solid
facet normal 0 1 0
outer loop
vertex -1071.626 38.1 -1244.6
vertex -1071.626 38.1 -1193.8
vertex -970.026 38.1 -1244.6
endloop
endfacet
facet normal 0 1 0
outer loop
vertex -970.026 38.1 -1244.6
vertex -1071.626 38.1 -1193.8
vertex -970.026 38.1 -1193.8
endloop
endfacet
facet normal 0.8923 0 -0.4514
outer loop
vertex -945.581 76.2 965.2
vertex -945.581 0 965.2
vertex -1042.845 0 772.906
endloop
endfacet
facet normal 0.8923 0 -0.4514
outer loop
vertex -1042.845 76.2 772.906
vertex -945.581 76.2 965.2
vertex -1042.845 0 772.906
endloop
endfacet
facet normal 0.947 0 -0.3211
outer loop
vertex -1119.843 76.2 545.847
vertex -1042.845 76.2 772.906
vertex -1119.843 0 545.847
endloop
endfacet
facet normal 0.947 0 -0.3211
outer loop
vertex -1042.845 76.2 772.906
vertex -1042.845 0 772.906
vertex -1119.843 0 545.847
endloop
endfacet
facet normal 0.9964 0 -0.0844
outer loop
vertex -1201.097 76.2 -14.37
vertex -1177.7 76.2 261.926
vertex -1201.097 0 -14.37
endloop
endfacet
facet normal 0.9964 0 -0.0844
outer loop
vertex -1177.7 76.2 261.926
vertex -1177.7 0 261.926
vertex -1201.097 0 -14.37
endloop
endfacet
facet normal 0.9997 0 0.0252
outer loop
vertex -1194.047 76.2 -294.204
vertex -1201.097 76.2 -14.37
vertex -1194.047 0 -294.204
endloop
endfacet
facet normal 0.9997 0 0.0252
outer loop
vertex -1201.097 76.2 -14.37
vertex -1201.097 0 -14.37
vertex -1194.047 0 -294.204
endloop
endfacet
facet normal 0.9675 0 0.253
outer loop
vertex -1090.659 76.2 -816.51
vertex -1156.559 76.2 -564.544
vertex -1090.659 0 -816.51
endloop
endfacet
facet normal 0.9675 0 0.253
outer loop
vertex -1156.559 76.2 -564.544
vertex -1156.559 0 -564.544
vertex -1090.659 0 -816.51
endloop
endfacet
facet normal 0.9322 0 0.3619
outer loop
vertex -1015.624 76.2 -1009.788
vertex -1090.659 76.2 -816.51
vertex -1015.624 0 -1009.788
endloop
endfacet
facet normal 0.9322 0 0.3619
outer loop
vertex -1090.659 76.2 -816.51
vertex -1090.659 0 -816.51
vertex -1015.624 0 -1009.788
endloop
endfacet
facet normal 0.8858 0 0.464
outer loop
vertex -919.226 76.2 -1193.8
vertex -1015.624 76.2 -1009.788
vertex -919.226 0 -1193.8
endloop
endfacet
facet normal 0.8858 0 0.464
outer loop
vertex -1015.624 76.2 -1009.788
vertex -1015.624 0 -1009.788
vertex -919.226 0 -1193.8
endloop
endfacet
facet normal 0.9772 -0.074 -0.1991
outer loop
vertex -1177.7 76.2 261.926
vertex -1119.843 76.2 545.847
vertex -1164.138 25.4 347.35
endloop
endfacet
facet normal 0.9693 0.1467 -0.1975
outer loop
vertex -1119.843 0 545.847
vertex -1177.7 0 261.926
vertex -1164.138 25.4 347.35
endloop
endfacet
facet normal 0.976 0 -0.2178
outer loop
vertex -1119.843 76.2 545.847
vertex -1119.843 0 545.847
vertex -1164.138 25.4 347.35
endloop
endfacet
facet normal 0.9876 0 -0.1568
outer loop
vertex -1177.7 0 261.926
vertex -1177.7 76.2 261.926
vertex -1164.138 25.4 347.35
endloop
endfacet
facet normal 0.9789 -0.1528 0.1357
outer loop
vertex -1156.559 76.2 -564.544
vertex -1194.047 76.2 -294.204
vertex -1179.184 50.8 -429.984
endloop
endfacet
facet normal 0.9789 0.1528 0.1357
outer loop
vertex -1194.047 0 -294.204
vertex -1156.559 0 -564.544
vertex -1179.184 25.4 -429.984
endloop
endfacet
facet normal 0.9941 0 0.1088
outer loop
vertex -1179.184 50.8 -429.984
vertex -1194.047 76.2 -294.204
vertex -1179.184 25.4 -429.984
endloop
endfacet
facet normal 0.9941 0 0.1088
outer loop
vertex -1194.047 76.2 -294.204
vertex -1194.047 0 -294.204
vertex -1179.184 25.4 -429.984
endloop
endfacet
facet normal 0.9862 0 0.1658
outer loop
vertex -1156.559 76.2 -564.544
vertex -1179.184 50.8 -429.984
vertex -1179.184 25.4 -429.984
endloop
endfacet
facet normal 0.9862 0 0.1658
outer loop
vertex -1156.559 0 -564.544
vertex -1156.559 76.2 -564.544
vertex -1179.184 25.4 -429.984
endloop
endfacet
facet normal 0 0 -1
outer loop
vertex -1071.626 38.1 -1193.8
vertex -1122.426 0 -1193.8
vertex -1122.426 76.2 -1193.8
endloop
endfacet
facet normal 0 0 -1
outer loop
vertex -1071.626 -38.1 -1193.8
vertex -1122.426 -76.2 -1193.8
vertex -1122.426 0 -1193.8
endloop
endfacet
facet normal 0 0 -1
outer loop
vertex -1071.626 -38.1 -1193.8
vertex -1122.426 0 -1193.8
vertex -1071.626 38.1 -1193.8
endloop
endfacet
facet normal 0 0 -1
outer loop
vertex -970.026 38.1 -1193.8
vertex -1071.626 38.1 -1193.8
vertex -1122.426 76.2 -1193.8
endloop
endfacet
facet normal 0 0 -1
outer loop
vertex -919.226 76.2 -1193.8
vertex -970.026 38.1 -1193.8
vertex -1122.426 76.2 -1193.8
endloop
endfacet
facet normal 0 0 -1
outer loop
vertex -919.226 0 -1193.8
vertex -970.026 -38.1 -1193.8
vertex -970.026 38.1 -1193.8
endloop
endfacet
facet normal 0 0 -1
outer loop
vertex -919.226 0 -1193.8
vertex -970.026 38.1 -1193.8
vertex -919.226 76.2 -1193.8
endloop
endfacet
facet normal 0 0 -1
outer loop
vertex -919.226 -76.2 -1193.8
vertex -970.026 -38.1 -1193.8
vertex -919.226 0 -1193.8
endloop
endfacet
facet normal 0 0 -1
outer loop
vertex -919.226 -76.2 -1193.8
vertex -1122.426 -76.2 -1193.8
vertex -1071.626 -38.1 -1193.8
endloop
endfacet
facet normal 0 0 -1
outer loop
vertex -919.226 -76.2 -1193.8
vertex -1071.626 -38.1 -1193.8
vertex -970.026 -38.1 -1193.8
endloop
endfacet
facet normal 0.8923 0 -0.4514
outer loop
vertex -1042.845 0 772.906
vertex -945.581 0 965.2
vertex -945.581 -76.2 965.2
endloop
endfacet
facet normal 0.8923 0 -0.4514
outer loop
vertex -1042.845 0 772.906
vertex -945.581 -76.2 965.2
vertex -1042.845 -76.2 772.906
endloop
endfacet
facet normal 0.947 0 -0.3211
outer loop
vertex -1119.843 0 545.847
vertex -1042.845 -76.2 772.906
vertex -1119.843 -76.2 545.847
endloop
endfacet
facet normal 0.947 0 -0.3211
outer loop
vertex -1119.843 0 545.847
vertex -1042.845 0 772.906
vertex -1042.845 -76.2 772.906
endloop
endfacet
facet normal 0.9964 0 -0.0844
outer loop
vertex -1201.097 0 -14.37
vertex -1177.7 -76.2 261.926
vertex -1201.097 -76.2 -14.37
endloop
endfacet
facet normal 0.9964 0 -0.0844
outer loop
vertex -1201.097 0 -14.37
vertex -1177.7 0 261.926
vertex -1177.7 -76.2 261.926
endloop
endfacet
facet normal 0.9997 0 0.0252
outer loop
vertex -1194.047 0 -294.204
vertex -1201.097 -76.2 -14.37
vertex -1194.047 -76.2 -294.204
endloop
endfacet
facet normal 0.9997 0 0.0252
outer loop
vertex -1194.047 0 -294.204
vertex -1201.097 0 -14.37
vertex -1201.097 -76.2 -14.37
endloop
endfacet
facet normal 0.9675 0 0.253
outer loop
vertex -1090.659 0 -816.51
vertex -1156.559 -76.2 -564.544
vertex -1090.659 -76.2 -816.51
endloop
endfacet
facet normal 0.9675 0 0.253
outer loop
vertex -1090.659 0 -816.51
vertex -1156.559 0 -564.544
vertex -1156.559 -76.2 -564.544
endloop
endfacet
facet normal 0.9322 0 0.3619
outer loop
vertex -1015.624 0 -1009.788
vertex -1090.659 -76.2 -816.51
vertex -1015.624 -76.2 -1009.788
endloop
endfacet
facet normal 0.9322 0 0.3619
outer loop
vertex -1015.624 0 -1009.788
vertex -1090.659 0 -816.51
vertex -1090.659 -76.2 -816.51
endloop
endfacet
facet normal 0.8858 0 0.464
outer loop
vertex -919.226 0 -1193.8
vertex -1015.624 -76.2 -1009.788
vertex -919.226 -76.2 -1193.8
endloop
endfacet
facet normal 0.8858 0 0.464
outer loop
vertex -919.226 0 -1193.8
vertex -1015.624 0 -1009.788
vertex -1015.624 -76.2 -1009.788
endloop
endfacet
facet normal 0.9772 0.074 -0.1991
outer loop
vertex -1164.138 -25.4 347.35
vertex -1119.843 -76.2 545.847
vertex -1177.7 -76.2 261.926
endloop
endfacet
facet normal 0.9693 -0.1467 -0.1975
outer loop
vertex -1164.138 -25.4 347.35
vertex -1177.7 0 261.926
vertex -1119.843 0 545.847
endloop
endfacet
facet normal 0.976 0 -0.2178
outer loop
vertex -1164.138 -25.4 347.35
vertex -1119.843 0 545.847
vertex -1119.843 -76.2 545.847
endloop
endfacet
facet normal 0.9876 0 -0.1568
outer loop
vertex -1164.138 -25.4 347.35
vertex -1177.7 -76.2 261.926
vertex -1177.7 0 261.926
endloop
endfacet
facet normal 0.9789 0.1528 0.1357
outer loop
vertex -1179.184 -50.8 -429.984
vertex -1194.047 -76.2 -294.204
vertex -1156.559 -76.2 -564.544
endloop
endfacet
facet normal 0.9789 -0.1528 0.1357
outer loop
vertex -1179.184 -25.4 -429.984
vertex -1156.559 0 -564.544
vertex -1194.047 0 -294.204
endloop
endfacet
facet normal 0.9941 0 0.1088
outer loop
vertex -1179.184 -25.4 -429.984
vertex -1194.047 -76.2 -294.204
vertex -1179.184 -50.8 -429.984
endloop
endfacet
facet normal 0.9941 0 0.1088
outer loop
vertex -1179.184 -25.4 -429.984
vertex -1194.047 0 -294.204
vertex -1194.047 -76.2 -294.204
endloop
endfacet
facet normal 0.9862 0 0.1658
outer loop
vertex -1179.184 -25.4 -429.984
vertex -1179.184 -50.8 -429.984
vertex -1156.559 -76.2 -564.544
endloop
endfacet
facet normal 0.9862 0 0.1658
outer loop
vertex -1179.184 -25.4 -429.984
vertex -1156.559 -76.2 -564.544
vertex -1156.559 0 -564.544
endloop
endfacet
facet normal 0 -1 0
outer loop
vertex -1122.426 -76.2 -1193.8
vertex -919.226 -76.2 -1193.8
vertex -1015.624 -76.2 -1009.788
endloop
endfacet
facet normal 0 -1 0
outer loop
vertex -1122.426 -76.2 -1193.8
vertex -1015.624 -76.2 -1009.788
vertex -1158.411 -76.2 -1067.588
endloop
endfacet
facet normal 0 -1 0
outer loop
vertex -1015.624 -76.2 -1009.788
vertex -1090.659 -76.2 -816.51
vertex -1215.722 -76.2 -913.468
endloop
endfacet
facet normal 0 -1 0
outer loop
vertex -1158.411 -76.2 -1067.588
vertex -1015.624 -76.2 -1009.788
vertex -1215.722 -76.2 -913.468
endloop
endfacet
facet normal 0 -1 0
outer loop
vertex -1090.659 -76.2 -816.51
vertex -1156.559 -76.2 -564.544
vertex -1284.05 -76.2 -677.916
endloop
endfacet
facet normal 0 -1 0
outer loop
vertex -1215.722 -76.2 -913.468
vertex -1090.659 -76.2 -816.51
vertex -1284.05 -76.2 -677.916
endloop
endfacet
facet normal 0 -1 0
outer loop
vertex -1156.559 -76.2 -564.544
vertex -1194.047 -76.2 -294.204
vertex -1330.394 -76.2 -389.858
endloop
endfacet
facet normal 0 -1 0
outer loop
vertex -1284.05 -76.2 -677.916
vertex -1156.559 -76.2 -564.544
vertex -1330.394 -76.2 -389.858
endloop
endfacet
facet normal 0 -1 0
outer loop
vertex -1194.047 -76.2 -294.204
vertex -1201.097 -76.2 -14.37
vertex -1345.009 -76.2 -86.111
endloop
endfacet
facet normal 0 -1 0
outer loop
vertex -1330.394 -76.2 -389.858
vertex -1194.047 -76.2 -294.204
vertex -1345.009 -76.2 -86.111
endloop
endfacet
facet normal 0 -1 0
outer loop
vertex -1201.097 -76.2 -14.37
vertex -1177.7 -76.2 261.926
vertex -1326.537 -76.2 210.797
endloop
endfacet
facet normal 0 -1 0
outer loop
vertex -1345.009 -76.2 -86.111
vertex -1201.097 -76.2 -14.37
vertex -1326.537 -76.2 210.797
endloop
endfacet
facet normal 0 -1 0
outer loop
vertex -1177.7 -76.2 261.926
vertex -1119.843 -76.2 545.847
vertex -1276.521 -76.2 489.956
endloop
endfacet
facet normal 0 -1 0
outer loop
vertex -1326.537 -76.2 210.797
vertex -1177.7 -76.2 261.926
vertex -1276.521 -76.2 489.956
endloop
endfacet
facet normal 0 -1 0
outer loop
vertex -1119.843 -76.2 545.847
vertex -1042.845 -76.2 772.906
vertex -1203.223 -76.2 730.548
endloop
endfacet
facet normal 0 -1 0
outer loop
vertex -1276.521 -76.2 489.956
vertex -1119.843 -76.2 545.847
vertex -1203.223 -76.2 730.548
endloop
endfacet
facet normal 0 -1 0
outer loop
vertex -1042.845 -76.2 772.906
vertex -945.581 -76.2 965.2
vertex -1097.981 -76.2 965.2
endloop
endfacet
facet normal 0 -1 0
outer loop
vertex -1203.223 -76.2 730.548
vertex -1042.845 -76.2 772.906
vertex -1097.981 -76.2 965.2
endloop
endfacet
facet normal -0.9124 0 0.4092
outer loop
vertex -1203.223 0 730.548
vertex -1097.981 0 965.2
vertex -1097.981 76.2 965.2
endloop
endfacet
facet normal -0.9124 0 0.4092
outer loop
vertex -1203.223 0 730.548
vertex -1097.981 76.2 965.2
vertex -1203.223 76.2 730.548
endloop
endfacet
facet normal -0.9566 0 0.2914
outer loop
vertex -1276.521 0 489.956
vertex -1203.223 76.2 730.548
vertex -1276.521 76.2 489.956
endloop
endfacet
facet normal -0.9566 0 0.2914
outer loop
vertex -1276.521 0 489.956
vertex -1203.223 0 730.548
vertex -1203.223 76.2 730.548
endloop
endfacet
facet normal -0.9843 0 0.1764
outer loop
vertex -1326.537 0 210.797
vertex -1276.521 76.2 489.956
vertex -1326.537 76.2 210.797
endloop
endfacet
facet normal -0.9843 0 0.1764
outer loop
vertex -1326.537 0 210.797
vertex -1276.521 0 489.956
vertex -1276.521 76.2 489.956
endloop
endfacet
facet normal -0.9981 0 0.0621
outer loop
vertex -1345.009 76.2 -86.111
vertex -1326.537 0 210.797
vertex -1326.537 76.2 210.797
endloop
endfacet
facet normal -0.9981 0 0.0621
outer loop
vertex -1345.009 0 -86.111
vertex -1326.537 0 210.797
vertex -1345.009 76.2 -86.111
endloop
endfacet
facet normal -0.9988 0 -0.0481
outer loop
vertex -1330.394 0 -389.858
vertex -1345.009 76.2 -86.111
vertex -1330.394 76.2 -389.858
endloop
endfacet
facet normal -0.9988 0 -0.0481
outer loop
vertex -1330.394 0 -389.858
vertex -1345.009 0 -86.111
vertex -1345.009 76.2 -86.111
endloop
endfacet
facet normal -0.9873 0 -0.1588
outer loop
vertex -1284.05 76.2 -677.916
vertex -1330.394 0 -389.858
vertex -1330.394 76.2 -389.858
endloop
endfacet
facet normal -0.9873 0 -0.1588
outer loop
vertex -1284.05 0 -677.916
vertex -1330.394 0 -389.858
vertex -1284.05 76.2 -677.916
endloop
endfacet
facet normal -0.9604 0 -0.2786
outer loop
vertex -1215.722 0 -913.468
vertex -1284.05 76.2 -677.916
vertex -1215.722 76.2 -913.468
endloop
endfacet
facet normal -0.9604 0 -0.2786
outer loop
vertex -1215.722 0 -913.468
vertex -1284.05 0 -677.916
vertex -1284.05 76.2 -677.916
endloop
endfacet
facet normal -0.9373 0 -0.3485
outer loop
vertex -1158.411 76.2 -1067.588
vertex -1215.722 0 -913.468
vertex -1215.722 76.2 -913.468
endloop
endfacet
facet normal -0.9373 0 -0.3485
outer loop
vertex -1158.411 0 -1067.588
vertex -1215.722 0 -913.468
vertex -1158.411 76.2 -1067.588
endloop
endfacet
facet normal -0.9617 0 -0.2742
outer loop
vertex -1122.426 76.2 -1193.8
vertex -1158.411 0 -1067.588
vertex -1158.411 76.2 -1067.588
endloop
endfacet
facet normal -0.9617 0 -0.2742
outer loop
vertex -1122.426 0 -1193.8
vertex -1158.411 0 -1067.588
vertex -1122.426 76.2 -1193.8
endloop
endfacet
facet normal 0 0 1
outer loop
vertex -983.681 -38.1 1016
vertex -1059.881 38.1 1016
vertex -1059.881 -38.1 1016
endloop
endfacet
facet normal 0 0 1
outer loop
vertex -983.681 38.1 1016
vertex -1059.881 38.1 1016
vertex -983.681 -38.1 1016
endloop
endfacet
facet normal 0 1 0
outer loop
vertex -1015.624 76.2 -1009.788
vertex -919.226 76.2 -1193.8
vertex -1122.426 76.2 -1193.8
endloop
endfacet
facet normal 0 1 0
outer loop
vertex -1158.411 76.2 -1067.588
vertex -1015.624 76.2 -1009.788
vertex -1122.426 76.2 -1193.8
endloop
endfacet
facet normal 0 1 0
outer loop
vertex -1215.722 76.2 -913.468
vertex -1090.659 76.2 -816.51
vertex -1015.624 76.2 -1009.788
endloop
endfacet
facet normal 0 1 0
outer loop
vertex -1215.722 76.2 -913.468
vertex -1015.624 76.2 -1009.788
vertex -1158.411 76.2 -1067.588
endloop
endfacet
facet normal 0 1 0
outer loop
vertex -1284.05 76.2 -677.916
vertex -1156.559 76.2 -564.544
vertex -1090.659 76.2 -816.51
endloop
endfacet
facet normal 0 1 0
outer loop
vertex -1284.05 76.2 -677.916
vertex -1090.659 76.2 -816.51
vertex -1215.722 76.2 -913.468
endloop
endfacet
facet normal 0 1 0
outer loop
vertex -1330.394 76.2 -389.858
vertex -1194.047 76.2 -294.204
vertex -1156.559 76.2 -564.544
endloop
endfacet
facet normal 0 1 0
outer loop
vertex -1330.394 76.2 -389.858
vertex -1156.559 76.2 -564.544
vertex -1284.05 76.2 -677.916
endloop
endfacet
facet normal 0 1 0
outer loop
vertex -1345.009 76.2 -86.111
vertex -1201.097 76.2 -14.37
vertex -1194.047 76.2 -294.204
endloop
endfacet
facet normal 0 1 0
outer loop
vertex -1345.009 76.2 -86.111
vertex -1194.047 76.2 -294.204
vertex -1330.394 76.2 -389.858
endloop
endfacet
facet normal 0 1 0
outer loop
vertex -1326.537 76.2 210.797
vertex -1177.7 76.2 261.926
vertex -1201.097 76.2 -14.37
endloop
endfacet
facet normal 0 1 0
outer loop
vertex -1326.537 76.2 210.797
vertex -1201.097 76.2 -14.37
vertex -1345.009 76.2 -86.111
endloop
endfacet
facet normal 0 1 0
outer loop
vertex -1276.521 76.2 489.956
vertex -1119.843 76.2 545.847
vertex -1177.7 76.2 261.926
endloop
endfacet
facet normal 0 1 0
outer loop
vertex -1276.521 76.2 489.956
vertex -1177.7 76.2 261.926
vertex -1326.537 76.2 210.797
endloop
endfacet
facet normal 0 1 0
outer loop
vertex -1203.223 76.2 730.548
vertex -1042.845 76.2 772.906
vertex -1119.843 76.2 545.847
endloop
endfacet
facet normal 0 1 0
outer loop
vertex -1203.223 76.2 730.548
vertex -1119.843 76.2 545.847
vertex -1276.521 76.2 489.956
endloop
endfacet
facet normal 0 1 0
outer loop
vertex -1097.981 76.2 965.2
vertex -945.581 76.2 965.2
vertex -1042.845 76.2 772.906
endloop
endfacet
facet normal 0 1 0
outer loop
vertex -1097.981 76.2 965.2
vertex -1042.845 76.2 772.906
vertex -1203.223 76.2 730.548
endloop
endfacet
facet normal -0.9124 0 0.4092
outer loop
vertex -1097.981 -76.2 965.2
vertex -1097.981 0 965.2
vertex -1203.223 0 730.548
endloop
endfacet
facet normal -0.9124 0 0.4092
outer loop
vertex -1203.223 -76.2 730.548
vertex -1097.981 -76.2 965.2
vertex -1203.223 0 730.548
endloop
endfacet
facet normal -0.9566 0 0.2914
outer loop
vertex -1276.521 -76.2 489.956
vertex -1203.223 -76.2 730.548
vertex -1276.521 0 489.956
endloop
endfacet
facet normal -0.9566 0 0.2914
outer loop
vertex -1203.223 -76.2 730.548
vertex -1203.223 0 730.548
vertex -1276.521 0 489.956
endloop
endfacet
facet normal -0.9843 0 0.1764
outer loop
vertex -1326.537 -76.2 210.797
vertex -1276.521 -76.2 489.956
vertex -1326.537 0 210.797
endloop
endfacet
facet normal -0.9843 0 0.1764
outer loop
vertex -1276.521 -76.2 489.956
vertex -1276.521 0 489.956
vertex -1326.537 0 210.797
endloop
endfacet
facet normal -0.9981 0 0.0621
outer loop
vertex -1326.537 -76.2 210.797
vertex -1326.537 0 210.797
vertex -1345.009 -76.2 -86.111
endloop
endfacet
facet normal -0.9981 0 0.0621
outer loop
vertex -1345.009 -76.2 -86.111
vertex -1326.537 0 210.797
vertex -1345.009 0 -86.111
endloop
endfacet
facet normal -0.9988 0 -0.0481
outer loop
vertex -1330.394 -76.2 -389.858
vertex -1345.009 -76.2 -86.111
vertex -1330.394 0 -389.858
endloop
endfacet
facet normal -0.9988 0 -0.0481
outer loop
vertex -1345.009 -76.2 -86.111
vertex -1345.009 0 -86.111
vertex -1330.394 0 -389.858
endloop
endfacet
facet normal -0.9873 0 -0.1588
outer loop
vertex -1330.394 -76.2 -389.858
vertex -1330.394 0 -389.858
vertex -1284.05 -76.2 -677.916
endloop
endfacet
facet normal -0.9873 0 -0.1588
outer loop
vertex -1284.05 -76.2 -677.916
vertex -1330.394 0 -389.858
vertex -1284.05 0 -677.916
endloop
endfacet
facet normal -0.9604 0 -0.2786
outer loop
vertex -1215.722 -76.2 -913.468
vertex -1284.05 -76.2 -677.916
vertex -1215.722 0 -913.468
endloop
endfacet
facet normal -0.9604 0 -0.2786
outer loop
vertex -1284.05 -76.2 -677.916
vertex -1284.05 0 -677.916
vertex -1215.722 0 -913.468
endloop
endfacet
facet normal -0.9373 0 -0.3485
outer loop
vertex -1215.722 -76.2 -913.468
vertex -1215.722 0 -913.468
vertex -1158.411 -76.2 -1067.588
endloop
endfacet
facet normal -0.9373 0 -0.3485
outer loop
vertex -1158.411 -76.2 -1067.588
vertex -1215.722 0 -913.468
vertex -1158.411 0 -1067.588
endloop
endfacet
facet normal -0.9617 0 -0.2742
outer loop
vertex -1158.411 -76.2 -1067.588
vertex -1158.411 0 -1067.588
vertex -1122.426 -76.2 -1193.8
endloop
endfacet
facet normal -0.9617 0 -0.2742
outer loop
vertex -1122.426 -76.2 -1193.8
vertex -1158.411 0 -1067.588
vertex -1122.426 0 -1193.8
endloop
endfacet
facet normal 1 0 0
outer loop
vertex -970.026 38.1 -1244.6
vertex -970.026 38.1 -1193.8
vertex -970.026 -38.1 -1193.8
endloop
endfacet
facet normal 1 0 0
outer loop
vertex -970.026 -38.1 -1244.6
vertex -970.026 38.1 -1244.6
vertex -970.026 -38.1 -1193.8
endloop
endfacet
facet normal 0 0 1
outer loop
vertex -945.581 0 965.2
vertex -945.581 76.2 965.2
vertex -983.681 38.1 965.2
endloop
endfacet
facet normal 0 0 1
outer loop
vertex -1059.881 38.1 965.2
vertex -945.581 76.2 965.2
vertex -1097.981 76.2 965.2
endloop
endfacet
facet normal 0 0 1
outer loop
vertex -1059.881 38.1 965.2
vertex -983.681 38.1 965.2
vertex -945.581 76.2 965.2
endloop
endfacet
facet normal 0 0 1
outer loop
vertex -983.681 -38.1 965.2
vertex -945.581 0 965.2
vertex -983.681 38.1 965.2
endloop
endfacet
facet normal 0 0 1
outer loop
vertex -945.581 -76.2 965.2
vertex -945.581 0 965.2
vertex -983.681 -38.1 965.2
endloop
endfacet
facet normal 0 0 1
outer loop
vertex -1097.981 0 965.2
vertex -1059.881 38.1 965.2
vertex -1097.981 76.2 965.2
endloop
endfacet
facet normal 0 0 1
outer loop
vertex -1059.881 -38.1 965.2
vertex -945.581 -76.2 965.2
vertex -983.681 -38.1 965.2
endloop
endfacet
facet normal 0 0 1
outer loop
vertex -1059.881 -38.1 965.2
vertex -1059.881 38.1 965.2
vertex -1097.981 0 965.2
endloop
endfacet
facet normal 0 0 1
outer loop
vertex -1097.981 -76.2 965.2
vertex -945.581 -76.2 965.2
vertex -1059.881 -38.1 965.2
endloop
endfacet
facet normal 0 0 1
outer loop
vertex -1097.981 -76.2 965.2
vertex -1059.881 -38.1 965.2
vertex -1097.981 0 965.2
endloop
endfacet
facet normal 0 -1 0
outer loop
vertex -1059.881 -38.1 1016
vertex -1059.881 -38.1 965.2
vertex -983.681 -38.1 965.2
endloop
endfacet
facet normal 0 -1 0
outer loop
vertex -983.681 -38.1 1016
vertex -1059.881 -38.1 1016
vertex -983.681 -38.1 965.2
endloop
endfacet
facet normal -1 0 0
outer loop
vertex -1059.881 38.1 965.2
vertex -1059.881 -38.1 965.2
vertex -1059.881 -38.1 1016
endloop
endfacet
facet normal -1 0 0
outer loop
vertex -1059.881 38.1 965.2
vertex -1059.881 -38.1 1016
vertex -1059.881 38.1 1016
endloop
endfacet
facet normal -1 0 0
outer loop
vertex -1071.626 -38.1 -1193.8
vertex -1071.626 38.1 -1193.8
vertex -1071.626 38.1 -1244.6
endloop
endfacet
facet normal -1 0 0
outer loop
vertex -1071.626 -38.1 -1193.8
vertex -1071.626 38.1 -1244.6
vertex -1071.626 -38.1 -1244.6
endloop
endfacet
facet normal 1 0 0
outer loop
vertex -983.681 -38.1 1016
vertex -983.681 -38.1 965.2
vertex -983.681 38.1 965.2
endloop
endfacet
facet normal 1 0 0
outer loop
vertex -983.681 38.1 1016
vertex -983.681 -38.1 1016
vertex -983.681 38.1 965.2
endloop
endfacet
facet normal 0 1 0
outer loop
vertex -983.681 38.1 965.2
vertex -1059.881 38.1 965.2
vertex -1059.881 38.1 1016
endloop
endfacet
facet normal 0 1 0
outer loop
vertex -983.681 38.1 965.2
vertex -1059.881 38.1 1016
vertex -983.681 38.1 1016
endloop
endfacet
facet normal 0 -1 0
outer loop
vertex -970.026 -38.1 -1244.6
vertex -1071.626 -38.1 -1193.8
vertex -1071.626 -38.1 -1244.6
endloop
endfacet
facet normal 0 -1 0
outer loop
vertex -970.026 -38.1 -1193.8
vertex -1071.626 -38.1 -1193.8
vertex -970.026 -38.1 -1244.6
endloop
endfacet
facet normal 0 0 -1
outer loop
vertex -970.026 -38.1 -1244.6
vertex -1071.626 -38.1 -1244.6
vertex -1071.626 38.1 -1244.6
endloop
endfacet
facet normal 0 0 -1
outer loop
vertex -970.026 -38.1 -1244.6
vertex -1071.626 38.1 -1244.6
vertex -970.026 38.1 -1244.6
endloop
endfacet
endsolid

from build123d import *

# Parameters (mm, degrees)
F1_DEPTH = 76.2
F2_W     = 101.6
F2_H     = 76.2
F3_DEPTH = 50.8
F4_W     = 76.2
F4_H     = 76.2
F5_DEPTH = 50.8


with BuildPart() as f1:
    # F0 (on Front) → F1 (new body, symmetric)
    with BuildSketch(Plane.XZ):
        with BuildLine():
            add(Edge.make_bspline(
                [(-945.5808670162, 965.2), (-1242.0630128025, 484.7582280636), (-1340.5170440674, -494.4096505642), (-919.226, -1193.8)],
                knots=[0, 0, 0, 0, 2159.1608506583, 2159.1608506583, 2159.1608506583, 2159.1608506583], degree=3))
            Line((-945.5808670162, 965.2), (-1097.9808670162, 965.2))
            add(Edge.make_bspline(
                [(-1097.9808670162, 965.2), (-1417.2196388245, 366.0375773907), (-1348.5663086676, -720.7227352137), (-1140.6033039093, -1081.5900564194), (-1122.426, -1193.8)],
                knots=[0, 0, 0, 0, 0.6575295809, 1, 1, 1, 1], degree=3))
            Line((-1122.426, -1193.8), (-919.226, -1193.8))
        make_face()
    extrude(amount=F1_DEPTH, both=True)

    # F2 (on face) → F3 (join)
    with BuildSketch(Plane(origin=(0, 0, -1193.8), x_dir=(1, 0, 0), z_dir=(0, 0, -1))):
        with Locations((-1020.826, 0)):
            Rectangle(F2_W, F2_H)
    extrude(amount=F3_DEPTH)

    # F4 (on face) → F5 (join)
    with BuildSketch(Plane.XY.offset(965.2)):
        with Locations((-1021.7808670162, 0)):
            Rectangle(F4_W, F4_H)
    extrude(amount=F5_DEPTH)


solid = f1.part
